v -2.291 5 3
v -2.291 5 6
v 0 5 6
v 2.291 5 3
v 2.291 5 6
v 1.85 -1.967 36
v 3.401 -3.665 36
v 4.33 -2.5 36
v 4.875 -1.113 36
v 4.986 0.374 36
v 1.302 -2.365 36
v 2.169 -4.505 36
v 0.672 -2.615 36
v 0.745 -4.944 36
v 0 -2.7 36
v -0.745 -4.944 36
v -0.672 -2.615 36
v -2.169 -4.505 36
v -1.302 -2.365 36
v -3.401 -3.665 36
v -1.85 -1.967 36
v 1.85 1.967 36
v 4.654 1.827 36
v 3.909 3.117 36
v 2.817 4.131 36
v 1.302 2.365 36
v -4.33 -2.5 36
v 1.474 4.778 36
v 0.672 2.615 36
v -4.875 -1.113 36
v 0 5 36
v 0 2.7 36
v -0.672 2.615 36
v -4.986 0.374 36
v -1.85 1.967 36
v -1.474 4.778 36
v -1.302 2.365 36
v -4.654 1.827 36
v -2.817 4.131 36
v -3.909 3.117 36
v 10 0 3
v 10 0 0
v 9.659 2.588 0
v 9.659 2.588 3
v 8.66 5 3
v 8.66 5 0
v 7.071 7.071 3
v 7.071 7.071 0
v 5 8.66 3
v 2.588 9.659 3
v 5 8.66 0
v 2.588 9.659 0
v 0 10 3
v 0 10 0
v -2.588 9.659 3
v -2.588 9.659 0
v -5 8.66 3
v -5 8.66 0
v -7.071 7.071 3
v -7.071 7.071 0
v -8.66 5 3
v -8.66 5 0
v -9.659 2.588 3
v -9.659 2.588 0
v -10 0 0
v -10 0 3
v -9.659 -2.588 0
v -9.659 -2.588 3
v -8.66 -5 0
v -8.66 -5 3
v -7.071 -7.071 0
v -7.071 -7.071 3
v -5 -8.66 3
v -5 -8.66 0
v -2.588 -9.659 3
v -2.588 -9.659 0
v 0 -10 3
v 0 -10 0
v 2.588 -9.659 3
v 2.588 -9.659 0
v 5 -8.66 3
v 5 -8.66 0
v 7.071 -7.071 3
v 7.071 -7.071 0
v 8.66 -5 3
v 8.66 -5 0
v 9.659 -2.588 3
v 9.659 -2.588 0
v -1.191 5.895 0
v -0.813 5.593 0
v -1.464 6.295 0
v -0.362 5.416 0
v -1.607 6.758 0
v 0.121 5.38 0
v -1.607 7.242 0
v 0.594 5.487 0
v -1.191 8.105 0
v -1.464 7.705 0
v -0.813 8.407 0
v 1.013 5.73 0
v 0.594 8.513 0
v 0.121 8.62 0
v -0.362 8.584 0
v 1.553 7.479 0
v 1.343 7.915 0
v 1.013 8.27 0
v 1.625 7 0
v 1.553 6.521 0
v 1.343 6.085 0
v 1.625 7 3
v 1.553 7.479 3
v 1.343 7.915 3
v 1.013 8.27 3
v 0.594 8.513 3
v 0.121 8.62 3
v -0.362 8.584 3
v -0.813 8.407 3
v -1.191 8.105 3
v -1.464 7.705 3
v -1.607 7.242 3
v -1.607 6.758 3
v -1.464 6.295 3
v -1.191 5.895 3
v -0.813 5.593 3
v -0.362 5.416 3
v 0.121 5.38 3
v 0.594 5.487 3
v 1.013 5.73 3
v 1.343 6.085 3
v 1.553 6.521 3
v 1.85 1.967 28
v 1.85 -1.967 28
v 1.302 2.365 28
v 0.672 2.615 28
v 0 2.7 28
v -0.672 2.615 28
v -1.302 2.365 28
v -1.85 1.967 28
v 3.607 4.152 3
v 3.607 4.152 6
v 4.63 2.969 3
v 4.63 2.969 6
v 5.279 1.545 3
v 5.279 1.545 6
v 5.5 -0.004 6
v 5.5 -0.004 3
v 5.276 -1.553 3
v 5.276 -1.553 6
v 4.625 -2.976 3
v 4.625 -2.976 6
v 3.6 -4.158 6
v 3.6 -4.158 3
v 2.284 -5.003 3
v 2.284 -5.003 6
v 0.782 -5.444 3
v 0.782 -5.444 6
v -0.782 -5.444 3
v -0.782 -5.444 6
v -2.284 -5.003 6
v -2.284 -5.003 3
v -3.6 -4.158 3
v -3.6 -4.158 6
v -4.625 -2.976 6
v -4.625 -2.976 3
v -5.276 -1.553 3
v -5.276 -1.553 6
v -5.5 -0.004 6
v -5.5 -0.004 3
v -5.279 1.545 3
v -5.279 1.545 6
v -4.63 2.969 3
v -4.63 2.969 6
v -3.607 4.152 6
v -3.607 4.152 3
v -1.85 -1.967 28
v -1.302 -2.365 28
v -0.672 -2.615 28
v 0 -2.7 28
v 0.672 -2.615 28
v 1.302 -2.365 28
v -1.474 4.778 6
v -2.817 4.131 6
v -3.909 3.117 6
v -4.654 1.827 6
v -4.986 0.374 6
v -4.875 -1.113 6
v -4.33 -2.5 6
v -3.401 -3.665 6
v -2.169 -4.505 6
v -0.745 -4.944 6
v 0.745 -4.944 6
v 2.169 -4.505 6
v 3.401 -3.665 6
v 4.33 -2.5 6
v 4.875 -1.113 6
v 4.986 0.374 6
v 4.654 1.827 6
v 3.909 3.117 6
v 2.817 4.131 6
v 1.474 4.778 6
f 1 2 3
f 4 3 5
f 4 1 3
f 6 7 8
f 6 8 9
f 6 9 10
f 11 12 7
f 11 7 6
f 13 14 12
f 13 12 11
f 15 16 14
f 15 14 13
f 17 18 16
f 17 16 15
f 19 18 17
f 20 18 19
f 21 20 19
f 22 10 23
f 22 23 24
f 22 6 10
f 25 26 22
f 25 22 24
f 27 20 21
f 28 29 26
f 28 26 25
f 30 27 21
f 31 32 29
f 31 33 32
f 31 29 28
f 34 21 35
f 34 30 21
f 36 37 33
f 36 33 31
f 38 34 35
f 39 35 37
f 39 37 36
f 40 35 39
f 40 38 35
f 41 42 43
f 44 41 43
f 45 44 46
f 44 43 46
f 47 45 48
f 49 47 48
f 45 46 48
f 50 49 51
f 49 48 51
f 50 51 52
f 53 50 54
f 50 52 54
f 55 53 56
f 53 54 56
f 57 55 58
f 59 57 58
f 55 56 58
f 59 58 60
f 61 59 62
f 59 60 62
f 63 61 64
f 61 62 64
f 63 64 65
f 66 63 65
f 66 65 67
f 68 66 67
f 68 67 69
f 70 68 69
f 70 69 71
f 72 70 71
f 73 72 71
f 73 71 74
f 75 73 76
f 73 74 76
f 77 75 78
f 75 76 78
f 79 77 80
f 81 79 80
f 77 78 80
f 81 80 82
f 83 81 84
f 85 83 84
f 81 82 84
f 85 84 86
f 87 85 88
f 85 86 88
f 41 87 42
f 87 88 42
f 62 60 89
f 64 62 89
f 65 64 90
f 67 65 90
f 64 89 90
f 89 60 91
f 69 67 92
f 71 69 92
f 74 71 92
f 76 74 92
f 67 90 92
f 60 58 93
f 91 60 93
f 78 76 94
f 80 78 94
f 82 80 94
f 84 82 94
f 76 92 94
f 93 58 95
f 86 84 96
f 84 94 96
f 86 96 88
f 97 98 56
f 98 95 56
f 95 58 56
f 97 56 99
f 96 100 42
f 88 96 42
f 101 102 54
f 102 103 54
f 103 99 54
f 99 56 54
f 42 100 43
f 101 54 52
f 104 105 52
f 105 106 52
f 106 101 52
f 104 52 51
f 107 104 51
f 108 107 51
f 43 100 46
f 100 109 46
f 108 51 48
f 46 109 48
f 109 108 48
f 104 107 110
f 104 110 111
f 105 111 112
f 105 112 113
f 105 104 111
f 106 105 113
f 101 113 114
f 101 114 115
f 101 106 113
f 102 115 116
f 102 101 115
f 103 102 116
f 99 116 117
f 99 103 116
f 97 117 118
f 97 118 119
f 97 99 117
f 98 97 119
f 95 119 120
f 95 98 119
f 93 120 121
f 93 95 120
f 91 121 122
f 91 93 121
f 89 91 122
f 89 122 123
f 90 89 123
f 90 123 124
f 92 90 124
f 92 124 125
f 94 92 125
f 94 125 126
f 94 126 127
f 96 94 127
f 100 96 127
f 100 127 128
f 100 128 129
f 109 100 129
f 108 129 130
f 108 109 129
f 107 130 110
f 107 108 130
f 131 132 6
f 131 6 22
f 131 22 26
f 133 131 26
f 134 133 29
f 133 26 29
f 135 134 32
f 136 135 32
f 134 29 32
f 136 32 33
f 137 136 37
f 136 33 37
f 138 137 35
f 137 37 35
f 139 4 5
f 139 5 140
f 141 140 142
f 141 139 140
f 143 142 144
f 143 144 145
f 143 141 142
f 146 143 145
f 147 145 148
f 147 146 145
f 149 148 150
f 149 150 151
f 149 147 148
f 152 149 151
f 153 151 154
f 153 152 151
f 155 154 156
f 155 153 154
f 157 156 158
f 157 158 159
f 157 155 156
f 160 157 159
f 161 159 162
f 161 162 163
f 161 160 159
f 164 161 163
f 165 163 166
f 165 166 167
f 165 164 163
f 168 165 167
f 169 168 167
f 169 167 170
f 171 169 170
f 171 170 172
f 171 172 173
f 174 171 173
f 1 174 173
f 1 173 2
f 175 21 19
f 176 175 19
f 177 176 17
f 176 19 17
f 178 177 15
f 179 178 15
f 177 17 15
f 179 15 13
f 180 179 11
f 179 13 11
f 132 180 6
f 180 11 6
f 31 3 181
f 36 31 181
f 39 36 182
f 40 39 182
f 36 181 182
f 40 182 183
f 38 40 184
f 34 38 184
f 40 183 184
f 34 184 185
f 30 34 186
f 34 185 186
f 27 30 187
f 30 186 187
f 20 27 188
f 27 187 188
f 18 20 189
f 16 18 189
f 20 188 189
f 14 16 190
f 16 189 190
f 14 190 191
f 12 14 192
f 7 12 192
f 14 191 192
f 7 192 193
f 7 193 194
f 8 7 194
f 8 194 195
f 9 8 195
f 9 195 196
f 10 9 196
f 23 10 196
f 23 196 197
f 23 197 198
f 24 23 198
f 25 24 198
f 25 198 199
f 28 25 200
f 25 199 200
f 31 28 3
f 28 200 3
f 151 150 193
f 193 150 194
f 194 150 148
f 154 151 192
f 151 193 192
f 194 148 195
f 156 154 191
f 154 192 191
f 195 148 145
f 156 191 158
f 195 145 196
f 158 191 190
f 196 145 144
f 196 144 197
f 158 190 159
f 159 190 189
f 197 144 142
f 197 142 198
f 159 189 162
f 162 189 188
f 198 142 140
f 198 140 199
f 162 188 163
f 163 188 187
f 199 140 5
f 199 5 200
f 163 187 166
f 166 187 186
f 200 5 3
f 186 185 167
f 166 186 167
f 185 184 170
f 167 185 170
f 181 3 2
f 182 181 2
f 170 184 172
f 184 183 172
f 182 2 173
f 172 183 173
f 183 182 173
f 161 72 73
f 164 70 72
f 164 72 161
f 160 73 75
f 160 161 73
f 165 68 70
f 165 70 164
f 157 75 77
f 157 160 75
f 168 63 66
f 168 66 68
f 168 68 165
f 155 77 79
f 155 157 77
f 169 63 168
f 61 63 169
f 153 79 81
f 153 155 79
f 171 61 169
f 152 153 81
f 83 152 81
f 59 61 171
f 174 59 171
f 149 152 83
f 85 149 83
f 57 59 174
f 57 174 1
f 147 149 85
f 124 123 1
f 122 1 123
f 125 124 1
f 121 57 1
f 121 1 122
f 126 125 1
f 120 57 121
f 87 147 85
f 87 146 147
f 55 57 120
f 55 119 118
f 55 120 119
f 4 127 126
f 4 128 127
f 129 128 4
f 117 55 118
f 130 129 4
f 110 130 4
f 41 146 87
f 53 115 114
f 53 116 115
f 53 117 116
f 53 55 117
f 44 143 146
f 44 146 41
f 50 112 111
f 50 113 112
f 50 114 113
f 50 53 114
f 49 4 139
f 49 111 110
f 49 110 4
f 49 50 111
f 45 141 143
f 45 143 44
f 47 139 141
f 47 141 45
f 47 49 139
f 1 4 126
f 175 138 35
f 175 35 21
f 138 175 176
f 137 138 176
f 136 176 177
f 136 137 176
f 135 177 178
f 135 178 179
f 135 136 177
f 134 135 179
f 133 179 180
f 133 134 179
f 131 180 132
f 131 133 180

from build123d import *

# Parameters (mm, degrees)
SKETCH1_R           = 10
SKETCH1_R_2         = 1.625
BOSS_EXTRUDE1_DEPTH = 3
BOSS_EXTRUDE2_DEPTH = 3
SKETCH3_R           = 5
BOSS_EXTRUDE3_DEPTH = 30
CUT_EXTRUDE1_DEPTH  = 8


with BuildPart() as part:
    # Sketch1 → Boss-Extrude1 (new body)
    with BuildSketch(Plane.XY):
        Circle(SKETCH1_R)
        with Locations((0, 7)):
            Circle(SKETCH1_R_2, mode=Mode.SUBTRACT)
    extrude(amount=BOSS_EXTRUDE1_DEPTH)

    # Sketch2 → Boss-Extrude2 (add)
    with BuildSketch(Plane.XY.offset(3)):
        with BuildLine():
            Line((-2.291287847, 5), (2.291287847, 5))
            ThreePointArc((2.291287847, 5), (0, -5.5), (-2.291287847, 5))
        make_face()
    extrude(amount=BOSS_EXTRUDE2_DEPTH)

    # Sketch3 → Boss-Extrude3 (add)
    with BuildSketch(Plane.XY.offset(6)):
        with Locations(Location((0, 0, 0), (0, 0, 90))):
            Circle(SKETCH3_R)
    extrude(amount=BOSS_EXTRUDE3_DEPTH)

    # Sketch4 → Cut-Extrude1 (cut)
    with BuildSketch(Plane.XY.offset(36)):
        with BuildLine():
            Line((1.85, -1.966596044), (1.85, 1.966596044))
            ThreePointArc((1.85, 1.966596044), (0, 2.7), (-1.85, 1.966596044))
            Line((-1.85, 1.966596044), (-1.85, -1.966596044))
            ThreePointArc((-1.85, -1.966596044), (0, -2.7), (1.85, -1.966596044))
        make_face()
    extrude(amount=-CUT_EXTRUDE1_DEPTH, mode=Mode.SUBTRACT)


solid = part.part
